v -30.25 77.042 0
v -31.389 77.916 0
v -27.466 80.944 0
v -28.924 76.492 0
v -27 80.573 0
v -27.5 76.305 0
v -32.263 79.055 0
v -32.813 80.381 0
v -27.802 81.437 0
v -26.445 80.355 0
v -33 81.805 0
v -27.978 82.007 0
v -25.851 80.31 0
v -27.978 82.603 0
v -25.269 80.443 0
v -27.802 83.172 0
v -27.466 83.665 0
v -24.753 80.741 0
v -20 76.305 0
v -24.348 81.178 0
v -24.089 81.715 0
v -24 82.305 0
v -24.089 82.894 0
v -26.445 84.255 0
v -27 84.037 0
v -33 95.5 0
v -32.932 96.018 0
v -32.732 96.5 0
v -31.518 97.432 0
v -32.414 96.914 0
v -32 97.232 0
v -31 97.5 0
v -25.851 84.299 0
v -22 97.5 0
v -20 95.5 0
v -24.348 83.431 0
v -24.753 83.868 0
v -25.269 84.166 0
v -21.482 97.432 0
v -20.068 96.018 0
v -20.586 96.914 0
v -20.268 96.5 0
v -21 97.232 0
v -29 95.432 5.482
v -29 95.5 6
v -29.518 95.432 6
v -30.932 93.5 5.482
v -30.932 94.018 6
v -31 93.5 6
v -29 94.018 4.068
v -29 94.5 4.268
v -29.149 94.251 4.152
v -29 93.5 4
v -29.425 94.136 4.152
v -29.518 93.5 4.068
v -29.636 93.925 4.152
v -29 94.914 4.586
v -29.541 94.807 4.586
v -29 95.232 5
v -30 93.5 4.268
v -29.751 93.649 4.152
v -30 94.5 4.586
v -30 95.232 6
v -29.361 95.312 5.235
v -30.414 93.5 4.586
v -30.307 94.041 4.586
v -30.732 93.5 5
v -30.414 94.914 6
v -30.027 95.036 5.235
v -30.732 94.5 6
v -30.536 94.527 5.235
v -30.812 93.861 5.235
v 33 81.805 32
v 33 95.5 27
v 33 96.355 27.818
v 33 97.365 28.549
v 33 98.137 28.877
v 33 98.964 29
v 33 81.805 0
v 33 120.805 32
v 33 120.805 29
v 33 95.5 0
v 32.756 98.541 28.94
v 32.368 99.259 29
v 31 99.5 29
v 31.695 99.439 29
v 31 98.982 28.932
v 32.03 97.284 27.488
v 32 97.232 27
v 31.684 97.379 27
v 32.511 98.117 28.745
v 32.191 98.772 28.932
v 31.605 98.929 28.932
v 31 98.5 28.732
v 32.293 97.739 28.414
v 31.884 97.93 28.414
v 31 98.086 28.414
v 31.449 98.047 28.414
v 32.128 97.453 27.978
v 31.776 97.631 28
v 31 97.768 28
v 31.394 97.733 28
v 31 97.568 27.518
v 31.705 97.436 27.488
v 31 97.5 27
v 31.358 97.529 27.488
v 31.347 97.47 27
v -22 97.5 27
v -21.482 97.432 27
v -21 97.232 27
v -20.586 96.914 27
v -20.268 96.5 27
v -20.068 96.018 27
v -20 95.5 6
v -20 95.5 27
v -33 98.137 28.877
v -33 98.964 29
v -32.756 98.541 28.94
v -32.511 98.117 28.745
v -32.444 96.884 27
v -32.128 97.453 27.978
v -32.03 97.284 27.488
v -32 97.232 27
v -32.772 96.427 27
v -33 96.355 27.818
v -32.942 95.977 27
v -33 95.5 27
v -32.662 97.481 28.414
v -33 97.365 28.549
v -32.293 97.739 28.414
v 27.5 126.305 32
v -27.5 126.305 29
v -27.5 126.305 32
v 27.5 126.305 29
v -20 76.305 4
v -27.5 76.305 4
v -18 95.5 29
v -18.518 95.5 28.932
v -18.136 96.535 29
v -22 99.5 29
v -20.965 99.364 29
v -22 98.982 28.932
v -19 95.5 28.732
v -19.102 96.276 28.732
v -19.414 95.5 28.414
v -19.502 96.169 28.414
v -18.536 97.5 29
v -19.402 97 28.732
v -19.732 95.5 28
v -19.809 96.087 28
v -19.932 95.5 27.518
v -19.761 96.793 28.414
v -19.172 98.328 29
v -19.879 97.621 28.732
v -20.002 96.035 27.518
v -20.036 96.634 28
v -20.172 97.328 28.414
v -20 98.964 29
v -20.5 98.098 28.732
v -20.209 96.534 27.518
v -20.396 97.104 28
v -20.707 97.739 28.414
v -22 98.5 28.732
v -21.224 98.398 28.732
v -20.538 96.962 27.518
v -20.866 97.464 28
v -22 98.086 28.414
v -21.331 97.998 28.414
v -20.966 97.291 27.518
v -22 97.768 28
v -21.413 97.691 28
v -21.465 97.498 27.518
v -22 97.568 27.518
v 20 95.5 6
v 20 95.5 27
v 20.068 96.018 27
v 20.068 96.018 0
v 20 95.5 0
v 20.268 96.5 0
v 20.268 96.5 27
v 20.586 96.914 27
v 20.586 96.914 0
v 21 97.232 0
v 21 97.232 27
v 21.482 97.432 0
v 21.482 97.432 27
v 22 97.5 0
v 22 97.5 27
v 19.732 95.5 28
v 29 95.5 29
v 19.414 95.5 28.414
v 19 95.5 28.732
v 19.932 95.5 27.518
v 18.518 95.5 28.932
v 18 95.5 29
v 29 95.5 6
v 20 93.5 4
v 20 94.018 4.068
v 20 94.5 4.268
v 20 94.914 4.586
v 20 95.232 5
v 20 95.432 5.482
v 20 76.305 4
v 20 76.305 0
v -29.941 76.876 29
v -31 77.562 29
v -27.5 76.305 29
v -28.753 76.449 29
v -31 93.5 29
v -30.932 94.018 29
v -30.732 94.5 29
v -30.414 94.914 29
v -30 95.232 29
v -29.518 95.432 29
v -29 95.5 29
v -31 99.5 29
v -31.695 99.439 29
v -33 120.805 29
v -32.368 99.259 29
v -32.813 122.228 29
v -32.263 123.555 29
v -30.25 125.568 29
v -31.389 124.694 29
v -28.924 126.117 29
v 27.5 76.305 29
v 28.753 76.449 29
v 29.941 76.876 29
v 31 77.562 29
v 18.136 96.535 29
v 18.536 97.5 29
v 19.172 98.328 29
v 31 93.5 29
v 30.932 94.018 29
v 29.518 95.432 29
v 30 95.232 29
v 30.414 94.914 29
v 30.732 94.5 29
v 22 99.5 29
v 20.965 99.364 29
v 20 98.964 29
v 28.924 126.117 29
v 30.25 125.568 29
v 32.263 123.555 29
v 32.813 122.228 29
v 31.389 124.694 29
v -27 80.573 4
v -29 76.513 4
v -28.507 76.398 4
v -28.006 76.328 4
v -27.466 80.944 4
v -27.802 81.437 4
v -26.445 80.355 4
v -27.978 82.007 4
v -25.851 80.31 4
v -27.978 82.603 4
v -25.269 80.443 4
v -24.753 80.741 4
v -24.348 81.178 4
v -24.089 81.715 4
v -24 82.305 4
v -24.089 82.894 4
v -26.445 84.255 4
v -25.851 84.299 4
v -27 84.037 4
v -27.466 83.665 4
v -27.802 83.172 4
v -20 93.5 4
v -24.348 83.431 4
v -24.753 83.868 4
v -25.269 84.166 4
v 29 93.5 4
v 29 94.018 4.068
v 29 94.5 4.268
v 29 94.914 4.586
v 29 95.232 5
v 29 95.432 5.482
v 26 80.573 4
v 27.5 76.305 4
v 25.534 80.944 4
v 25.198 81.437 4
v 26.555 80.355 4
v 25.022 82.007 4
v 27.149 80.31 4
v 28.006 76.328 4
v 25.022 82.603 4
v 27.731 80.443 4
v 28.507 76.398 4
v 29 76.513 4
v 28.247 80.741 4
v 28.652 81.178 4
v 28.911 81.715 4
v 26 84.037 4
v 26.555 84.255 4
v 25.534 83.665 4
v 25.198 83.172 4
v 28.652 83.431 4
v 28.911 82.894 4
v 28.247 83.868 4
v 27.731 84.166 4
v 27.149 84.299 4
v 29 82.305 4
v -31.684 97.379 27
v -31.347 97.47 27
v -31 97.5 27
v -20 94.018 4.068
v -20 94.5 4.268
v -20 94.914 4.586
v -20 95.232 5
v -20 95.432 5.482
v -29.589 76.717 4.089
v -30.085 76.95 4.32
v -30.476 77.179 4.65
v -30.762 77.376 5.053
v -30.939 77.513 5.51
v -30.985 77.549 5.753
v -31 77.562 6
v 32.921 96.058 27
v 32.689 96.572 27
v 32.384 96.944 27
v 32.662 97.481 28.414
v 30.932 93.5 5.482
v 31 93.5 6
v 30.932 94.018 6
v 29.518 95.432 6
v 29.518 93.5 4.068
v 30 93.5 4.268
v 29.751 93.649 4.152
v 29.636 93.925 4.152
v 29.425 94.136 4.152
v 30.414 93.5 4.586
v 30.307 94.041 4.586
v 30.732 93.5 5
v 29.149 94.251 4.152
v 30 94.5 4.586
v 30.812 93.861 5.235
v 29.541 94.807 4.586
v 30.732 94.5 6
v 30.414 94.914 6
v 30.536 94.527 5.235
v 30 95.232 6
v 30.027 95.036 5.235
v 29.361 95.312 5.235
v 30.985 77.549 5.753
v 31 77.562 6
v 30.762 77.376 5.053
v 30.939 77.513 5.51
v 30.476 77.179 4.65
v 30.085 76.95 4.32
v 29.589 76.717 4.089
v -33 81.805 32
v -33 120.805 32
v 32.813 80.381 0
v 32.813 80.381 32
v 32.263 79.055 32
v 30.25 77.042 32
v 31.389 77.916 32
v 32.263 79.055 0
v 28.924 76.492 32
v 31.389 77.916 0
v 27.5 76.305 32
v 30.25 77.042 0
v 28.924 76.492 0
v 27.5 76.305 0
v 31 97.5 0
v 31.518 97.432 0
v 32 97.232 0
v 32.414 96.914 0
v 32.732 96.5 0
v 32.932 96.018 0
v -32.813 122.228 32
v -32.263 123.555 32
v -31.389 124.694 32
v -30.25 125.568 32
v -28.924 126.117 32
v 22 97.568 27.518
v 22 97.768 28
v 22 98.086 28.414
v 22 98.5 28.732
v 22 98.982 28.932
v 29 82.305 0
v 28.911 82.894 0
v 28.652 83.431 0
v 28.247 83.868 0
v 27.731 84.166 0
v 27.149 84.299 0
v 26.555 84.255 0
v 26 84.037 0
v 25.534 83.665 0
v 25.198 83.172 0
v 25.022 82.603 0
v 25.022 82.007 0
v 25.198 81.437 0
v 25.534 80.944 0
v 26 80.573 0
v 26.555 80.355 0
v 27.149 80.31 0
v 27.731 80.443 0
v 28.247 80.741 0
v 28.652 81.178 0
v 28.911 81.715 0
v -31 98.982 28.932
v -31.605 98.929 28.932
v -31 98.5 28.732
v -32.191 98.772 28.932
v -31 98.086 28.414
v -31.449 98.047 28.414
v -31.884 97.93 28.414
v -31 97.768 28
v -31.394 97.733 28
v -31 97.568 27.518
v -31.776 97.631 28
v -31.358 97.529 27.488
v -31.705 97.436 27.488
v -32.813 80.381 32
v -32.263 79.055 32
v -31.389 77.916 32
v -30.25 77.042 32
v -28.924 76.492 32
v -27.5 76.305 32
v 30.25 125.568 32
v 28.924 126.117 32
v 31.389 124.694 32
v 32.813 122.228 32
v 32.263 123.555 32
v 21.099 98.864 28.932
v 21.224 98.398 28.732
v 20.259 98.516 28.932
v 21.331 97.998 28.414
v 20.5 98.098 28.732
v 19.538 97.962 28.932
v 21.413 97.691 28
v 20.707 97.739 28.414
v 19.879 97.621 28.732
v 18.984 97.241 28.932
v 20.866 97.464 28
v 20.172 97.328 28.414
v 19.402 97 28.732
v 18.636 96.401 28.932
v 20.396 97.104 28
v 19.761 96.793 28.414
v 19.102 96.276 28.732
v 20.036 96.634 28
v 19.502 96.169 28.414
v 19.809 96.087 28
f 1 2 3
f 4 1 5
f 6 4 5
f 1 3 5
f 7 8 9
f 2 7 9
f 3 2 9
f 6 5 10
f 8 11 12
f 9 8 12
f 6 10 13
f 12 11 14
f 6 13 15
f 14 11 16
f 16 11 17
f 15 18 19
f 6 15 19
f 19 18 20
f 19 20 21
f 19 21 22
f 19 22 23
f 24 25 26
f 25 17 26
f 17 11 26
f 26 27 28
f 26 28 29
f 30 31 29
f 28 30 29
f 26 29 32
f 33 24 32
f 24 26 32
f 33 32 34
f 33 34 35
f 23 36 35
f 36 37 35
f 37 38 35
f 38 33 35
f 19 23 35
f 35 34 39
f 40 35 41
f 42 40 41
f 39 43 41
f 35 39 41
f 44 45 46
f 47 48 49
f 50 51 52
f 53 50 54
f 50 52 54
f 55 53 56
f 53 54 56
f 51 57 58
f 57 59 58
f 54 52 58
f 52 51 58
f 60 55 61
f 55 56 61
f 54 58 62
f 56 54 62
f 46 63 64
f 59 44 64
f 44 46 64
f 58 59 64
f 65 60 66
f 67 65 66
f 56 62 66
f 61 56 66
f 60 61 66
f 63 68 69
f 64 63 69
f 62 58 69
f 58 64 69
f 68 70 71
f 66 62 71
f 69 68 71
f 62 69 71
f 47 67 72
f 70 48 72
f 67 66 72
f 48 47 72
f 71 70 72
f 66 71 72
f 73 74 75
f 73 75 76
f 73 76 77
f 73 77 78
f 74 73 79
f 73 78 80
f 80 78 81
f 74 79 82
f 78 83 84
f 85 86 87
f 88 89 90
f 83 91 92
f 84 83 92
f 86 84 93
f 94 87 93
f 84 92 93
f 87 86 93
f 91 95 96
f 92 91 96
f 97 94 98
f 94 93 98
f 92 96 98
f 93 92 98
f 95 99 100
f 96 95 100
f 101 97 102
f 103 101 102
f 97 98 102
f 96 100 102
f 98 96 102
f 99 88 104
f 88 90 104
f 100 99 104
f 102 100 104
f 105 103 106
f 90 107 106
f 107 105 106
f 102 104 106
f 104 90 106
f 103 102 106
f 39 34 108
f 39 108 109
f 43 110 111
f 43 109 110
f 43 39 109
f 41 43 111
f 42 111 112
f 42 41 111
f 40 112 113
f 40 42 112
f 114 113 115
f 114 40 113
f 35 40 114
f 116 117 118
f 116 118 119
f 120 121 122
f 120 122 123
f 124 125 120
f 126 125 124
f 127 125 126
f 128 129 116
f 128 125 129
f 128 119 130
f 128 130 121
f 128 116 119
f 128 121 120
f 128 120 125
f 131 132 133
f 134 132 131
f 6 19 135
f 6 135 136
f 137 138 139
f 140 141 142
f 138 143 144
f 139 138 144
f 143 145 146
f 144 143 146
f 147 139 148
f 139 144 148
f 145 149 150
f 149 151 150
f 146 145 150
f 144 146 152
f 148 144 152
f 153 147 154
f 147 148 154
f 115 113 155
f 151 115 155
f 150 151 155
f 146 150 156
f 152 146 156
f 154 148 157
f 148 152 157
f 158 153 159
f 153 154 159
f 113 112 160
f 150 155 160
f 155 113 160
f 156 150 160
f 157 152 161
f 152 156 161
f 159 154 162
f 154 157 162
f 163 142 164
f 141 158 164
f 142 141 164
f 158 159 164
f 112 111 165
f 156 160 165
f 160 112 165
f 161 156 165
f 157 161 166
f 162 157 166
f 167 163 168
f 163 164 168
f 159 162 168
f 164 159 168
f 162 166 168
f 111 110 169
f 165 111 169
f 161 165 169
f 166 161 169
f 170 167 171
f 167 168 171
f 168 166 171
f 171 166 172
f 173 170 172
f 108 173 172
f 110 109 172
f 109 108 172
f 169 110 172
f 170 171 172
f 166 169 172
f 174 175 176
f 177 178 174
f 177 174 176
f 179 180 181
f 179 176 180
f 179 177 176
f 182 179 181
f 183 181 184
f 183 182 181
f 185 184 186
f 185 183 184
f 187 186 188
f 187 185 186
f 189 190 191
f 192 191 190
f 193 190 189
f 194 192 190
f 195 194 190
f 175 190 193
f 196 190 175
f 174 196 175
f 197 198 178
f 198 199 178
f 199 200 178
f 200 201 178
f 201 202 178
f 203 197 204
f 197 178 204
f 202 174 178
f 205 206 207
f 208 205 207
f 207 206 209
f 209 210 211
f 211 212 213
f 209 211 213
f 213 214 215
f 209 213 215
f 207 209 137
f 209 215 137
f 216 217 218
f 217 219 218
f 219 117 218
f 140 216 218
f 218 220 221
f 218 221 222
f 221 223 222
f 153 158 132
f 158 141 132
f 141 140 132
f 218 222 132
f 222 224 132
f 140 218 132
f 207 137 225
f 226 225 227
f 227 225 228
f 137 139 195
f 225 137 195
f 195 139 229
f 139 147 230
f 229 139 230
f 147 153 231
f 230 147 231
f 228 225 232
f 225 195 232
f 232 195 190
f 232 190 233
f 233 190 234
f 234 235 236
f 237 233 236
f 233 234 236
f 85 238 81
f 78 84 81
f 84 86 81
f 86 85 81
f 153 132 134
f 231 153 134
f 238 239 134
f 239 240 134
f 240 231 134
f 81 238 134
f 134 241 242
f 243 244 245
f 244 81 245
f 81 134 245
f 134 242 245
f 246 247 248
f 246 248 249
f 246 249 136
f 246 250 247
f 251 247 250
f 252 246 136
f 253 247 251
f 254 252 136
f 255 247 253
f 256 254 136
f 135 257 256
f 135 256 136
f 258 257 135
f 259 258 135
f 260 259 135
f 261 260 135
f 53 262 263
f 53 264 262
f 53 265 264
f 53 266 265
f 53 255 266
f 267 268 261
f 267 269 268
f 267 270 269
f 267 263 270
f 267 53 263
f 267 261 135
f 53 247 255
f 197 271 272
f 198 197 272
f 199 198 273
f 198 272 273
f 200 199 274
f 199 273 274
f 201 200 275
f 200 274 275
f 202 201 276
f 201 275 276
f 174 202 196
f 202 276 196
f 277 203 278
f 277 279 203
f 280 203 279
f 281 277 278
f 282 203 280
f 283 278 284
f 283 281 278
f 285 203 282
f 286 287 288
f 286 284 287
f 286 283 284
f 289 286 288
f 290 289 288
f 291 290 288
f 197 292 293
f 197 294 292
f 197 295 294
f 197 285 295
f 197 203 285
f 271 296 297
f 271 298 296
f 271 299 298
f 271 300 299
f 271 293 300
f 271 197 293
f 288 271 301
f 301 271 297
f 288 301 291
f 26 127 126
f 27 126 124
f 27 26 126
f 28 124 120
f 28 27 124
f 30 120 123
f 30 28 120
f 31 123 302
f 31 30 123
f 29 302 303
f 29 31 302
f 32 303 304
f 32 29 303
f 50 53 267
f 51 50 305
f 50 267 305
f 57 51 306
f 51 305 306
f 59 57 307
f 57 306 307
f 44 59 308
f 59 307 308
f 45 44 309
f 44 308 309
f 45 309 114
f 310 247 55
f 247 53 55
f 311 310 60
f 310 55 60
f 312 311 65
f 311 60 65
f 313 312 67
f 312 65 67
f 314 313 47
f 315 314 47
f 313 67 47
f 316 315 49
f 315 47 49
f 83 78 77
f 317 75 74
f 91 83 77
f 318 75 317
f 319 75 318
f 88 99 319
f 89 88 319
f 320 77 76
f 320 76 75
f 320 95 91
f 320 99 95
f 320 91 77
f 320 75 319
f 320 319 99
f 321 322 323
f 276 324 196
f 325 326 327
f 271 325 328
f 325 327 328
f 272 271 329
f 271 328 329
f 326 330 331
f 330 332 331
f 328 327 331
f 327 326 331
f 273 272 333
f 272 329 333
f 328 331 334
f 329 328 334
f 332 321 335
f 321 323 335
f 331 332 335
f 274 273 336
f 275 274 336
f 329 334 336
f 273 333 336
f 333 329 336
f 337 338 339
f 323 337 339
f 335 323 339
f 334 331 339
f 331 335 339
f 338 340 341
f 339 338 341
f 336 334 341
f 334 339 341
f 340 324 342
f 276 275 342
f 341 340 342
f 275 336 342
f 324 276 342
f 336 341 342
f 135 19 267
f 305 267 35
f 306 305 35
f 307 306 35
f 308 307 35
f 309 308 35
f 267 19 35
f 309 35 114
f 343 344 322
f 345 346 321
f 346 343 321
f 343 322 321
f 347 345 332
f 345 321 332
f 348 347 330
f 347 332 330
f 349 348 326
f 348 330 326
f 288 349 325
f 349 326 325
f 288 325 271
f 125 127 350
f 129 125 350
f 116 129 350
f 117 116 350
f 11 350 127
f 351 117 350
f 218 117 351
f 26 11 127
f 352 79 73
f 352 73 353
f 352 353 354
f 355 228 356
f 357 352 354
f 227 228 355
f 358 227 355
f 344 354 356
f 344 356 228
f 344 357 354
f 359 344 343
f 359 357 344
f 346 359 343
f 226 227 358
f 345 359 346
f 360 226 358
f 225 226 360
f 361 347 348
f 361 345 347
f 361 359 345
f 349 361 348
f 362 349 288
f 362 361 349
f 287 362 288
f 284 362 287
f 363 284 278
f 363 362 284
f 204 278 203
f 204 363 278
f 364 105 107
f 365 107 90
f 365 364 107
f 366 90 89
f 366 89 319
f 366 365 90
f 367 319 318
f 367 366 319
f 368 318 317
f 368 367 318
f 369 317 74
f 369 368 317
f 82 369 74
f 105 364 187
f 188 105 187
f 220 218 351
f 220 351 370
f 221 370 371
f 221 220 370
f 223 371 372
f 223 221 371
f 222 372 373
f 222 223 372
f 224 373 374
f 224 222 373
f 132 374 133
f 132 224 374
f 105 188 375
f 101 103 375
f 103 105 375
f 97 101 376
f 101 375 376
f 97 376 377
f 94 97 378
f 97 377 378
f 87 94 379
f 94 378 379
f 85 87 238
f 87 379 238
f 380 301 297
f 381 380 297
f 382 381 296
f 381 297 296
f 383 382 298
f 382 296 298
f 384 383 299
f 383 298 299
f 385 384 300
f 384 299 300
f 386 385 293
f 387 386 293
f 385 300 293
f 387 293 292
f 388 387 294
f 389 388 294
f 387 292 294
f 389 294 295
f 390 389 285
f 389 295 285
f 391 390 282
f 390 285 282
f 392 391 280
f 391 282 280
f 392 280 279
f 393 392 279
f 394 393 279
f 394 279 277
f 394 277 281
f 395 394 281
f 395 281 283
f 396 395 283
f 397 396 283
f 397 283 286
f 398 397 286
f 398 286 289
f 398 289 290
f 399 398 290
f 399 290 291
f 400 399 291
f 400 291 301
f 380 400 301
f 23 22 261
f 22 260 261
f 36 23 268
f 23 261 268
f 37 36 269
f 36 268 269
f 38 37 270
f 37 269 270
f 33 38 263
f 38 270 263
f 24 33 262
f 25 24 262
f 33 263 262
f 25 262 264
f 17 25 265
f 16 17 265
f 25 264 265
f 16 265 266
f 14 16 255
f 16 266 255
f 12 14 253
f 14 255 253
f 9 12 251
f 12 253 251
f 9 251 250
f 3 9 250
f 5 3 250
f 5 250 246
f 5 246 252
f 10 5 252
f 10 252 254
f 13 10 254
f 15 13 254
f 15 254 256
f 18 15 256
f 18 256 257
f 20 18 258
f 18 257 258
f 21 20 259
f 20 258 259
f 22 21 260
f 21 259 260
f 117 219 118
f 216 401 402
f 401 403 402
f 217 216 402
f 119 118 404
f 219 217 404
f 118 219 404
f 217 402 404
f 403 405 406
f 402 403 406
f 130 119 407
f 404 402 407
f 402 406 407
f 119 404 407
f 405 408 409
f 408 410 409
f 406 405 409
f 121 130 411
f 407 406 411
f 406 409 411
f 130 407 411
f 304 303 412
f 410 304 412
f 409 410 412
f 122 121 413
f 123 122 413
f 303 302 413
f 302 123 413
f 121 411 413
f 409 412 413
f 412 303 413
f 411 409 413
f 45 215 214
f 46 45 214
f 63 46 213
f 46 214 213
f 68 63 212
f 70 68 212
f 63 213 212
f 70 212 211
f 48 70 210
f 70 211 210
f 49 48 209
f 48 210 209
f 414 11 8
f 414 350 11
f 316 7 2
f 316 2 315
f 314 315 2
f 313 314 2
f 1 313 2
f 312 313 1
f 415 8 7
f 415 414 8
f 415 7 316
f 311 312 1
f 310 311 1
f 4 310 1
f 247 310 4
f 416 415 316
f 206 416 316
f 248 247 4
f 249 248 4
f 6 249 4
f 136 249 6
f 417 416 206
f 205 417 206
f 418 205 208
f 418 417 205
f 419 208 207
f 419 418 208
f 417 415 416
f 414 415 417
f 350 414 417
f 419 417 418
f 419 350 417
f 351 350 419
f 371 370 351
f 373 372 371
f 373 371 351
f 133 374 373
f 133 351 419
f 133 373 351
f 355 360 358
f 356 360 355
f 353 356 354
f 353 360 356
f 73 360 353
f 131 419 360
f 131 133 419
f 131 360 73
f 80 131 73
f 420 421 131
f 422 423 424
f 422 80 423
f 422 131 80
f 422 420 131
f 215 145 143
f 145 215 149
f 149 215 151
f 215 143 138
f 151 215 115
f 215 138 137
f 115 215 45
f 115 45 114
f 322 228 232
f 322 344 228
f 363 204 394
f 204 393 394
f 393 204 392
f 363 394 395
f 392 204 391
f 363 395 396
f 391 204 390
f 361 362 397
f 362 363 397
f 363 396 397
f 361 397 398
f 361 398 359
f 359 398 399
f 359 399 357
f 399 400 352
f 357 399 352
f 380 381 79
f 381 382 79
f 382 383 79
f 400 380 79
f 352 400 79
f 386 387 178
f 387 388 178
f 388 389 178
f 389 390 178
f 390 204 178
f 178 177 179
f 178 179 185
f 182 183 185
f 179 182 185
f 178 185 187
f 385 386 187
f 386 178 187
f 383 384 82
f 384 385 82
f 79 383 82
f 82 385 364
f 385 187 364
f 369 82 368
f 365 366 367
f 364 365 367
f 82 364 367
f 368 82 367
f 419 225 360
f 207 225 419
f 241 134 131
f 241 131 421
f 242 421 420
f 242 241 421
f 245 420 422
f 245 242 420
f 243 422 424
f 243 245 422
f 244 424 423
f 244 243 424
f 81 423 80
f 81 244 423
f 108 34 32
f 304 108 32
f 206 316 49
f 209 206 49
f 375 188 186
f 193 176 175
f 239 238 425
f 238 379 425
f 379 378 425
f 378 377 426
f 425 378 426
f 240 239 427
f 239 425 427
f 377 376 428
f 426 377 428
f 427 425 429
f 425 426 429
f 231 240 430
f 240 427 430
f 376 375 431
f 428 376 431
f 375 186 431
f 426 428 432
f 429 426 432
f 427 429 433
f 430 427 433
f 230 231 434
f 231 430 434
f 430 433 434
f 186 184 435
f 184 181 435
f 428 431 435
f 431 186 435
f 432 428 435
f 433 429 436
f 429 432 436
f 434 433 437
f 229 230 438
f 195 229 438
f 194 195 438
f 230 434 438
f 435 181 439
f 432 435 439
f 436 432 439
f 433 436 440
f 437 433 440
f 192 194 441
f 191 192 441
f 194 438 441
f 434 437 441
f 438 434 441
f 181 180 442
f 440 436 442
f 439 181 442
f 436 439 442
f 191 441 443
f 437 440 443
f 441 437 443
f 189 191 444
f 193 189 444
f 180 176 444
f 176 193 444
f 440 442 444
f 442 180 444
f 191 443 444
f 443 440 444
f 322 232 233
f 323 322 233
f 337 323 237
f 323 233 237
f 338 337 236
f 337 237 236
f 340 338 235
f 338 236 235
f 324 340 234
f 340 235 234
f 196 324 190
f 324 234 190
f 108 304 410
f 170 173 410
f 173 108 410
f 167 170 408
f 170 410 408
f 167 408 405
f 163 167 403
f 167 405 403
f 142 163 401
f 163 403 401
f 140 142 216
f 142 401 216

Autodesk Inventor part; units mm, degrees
ref_plane "YZ Plane" through (0, 0, 0) normal (1, 0, 0) x (0, 1, 0)
ref_plane "XZ Plane" through (0, 0, 0) normal (0, 1, 0) x (-1, 0, 0)
ref_plane "XY Plane" through (0, 0, 0) normal (0, 0, 1) x (1, 0, 0)
ref_plane "Work Plane1" through (0, 0, 0) normal (0, 0, 1) x (1, 0, 0)
sketch "Sketch1" plane through (0, 0, 0) normal (0, 0, 1) x (1, 0, 0)
  line L0 (-34.9568, 37.8) -> (-33.8, 37.8) projected
  arc A0 (-52.5, 15.282) -> (-34.9568, 37.8) centre (-55.9339, 36.05) ccw projected
  line L1 (-52.5, 15.282) -> (-52.5, -15) projected
  line L2 (-47.7, -15) -> (-52.5, -15) projected
  arc A1 (-33, -29.7) -> (-47.7, -15) centre (-47.7, -29.7) ccw projected
  line L3 (-33, -29.7) -> (-33, -95.5) projected
  arc A2 (-33, -95.5) -> (-31, -97.5) centre (-31, -95.5) ccw projected
  line L4 (-31, -97.5) -> (-22, -97.5) projected
  arc A3 (-22, -97.5) -> (-20, -95.5) centre (-22, -95.5) ccw projected
  line L5 (-20, -74.5) -> (-20, -95.5) projected
  arc A4 (-18, -72.5) -> (-20, -74.5) centre (-18, -74.5) ccw projected
  line L6 (18, -72.5) -> (-18, -72.5) projected
  arc A5 (20, -74.5) -> (18, -72.5) centre (18, -74.5) ccw projected
  line L7 (20, -74.5) -> (20, -95.5) projected
  arc A6 (20, -95.5) -> (22, -97.5) centre (22, -95.5) ccw projected
  line L8 (31, -97.5) -> (22, -97.5) projected
  arc A7 (31, -97.5) -> (33, -95.5) centre (31, -95.5) ccw projected
  line L9 (33, -29.7) -> (33, -95.5) projected
  arc A8 (47.7, -15) -> (33, -29.7) centre (47.7, -29.7) ccw projected
  line L10 (52.5, -15) -> (47.7, -15) projected
  line L11 (52.5, -15) -> (52.5, 15) projected
  line L12 (52.5, 15) -> (47.7, 15) projected
  arc A9 (33, 29.7) -> (47.7, 15) centre (47.7, 29.7) ccw projected
  line L13 (33, 29.7) -> (33, 95.5) projected
  arc A10 (33, 95.5) -> (31, 97.5) centre (31, 95.5) ccw projected
  line L14 (31, 97.5) -> (22, 97.5) projected
  arc A11 (22, 97.5) -> (20, 95.5) centre (22, 95.5) ccw projected
  line L15 (20, 95.5) -> (20, 74.5) projected
  arc A12 (18, 72.5) -> (20, 74.5) centre (18, 74.5) ccw projected
  line L16 (18, 72.5) -> (-18, 72.5) projected
  arc A13 (-20, 74.5) -> (-18, 72.5) centre (-18, 74.5) ccw projected
  line L17 (-20, 74.5) -> (-20, 95.5) projected
  arc A14 (-20, 95.5) -> (-22, 97.5) centre (-22, 95.5) ccw projected
  line L18 (-22, 97.5) -> (-31, 97.5) projected
  arc A15 (-31, 97.5) -> (-33, 95.5) centre (-31, 95.5) ccw projected
  line L19 (-33, 95.5) -> (-33, 74.5) projected
  arc A16 (-33.8, 72.9) -> (-33, 74.5) centre (-35, 74.5) ccw projected
  line L20 (-33.8, 72.9) -> (-33.8, 37.8) projected
  circle A17 centre (-21.8, 62.5) radius 3 projected
  circle A18 centre (26.5, 62.5) radius 4 projected
  arc A19 (-2.5981, -57.75) -> (2.5981, -57.75) centre (0, -56.25) ccw projected
  line L21 (-2.5981, -57.75) -> (-13, -57.75) projected
  line L22 (-13, -57.75) -> (-13, -54.75) projected
  line L23 (-2.5981, -54.75) -> (-13, -54.75) projected
  arc A20 (2.5981, -54.75) -> (-2.5981, -54.75) centre (0, -56.25) ccw projected
  line L24 (13, -54.75) -> (2.5981, -54.75) projected
  line L25 (13, -57.75) -> (13, -54.75) projected
  line L26 (13, -57.75) -> (2.5981, -57.75) projected
  circle A21 centre (-10.5, -67.75) radius 1.5 projected
  circle A22 centre (10.5, -67.75) radius 1.5 projected
  line L27 (-19.3171, -45) -> (-23.6904, -45) projected
  line L28 (-23.6904, -45) -> (-23.6904, -25.95) projected
  line L29 (-23.6904, -25.95) -> (-19.382, -25.95) projected
  spline S0 degree 3 poles (-19.382, -25.95) (-19.0461, -25.9523) (-18.3968, -25.9567) (-17.4563, -26.0086) (-16.581, -26.0848) (-15.773, -26.2013) (-15.0294, -26.3366) (-14.3557, -26.5178) (-13.7463, -26.7258) (-13.195, -26.968) (-12.693, -27.2522) (-12.2198, -27.5714) (-11.7698, -27.9304) (-11.3405, -28.3302) (-10.931, -28.768) (-10.5507, -29.2527) (-10.1877, -29.7717) (-9.8476, -30.3268) (-9.5449, -30.9169) (-9.2755, -31.5328) (-9.051, -32.1747) (-8.8682, -32.8419) (-8.7226, -33.5324) (-8.6207, -34.2476) (-8.5577, -34.9867) (-8.5513, -35.4876) (-8.5481, -35.7421) knots 0 0 0 0 0.060145 0.116262 0.168646 0.217421 0.26241 0.303907 0.342233 0.377621 0.411584 0.445386 0.479752 0.514569 0.550351 0.586994 0.624785 0.663736 0.70347 0.743462 0.784023 0.82514 0.867271 0.910311 0.954426 1 1 1 1 projected
  spline S1 degree 3 poles (-8.5481, -35.7421) (-8.5566, -36.1013) (-8.5733, -36.8083) (-8.7143, -37.8459) (-8.9423, -38.8405) (-9.263, -39.7843) (-9.6601, -40.6693) (-10.1357, -41.4778) (-10.6762, -42.2113) (-11.2862, -42.8578) (-11.9457, -43.4169) (-12.6337, -43.8901) (-13.3497, -44.2699) (-13.9819, -44.5071) (-14.5316, -44.6562) (-15.0135, -44.7428) (-15.562, -44.8231) (-16.1791, -44.8922) (-16.8667, -44.9395) (-17.6225, -44.9721) (-18.4469, -44.9964) (-19.0195, -44.9988) (-19.3171, -45) knots 0 0 0 0 0.065767 0.129467 0.191414 0.252424 0.311761 0.368786 0.423917 0.478313 0.53121 0.582008 0.630995 0.679292 0.705349 0.735235 0.768913 0.806892 0.848943 0.895126 0.945474 1 1 1 1 projected
  line L30 (3.7964, 45) -> (7.4446, 45) projected
  line L31 (7.4446, 45) -> (-0.2525, 25.95) projected
  line L32 (-0.2525, 25.95) -> (-3.4237, 25.95) projected
  line L33 (-3.4237, 25.95) -> (-11.1169, 45) projected
  line L34 (-11.1169, 45) -> (-7.4649, 45) projected
  line L35 (-7.4649, 45) -> (-5.9843, 41.0923) projected
  line L36 (-5.9843, 41.0923) -> (2.3158, 41.0923) projected
  line L37 (2.3158, 41.0923) -> (3.7964, 45) projected
  spline S2 degree 3 poles (-13.4371, 30.2927) (-13.4413, 30.1296) (-13.4494, 29.8083) (-13.522, 29.3359) (-13.6305, 28.88) (-13.7882, 28.4424) (-13.9927, 28.0235) (-14.2412, 27.6214) (-14.5373, 27.2397) (-14.8711, 26.8787) (-15.2388, 26.5488) (-15.6318, 26.2577) (-16.0477, 26.0117) (-16.4842, 25.8077) (-16.9438, 25.6516) (-17.4232, 25.5409) (-17.923, 25.475) (-18.263, 25.4661) (-18.4362, 25.4615) knots 0 0 0 0 0.063173 0.124457 0.184841 0.244567 0.304319 0.3652 0.427421 0.491262 0.555499 0.618605 0.680495 0.742473 0.804991 0.868252 0.932887 1 1 1 1 projected
  spline S3 degree 3 poles (-18.4362, 25.4615) (-18.6607, 25.4697) (-19.1078, 25.4861) (-19.7689, 25.614) (-20.4146, 25.8152) (-20.935, 26.0578) (-21.349, 26.2929) (-21.6663, 26.5093) (-21.9892, 26.7572) (-22.3203, 27.0374) (-22.6533, 27.3552) (-22.9979, 27.703) (-23.3493, 28.0837) (-23.5776, 28.3557) (-23.6948, 28.4953) knots 0 0 0 0 0.10691 0.212977 0.319777 0.428556 0.485857 0.546559 0.611431 0.679821 0.753159 0.830753 0.913133 1 1 1 1 projected
  line L38 (-23.6948, 28.4953) -> (-21.138, 30.8346) projected
  spline S4 degree 3 poles (-21.138, 30.8346) (-21.0285, 30.6801) (-20.8182, 30.3835) (-20.4774, 29.9864) (-20.1381, 29.6476) (-19.7972, 29.3685) (-19.4517, 29.1509) (-19.1022, 28.9969) (-18.7506, 28.899) (-18.5144, 28.8868) (-18.3981, 28.8808) knots 0 0 0 0 0.16242 0.311824 0.448433 0.573381 0.689077 0.797573 0.900293 1 1 1 1 projected
  spline S5 degree 3 poles (-18.3981, 28.8808) (-18.2895, 28.8846) (-18.08, 28.8919) (-17.7813, 28.965) (-17.5161, 29.091) (-17.2847, 29.2559) (-17.1014, 29.4544) (-16.955, 29.6627) (-16.8726, 29.8926) (-16.8617, 30.0505) (-16.8564, 30.1286) knots 0 0 0 0 0.148126 0.285993 0.416634 0.54738 0.671583 0.784401 0.893266 1 1 1 1 projected
  spline S6 degree 3 poles (-16.8564, 30.1286) (-16.8597, 30.2079) (-16.8665, 30.3676) (-16.932, 30.6016) (-17.0306, 30.8303) (-17.1249, 30.9695) (-17.1731, 31.0407) knots 0 0 0 0 0.241881 0.487115 0.737838 1 1 1 1 projected
  spline S7 degree 3 poles (-17.1731, 31.0407) (-17.2169, 31.096) (-17.3177, 31.2233) (-17.51, 31.425) (-17.7515, 31.672) (-18.0515, 31.9559) (-18.3975, 32.2869) (-18.8055, 32.6521) (-19.2639, 33.0626) (-19.5897, 33.3485) (-19.7604, 33.4983) knots 0 0 0 0 0.059234 0.136349 0.233805 0.349411 0.483179 0.635967 0.809243 1 1 1 1 projected
  spline S8 degree 3 poles (-19.7604, 33.4983) (-19.9207, 33.6369) (-20.2248, 33.9001) (-20.6575, 34.2737) (-21.0377, 34.6098) (-21.3711, 34.9034) (-21.6525, 35.1575) (-21.8832, 35.3734) (-22.066, 35.5468) (-22.1698, 35.6516) (-22.2142, 35.6963) knots 0 0 0 0 0.192953 0.366184 0.520457 0.655012 0.770624 0.865677 0.942675 1 1 1 1 projected
  spline S9 degree 3 poles (-22.2142, 35.6963) (-22.3823, 35.8783) (-22.7056, 36.2282) (-23.1258, 36.7704) (-23.4717, 37.2997) (-23.7392, 37.8261) (-23.9412, 38.3571) (-24.0837, 38.9058) (-24.169, 39.4779) (-24.1785, 39.8683) (-24.1833, 40.0658) knots 0 0 0 0 0.150833 0.289954 0.417139 0.535255 0.648751 0.762405 0.879827 1 1 1 1 projected
  spline S10 degree 3 poles (-24.1833, 40.0658) (-24.1799, 40.2582) (-24.1732, 40.6357) (-24.0912, 41.1881) (-23.9744, 41.7167) (-23.7937, 42.2159) (-23.5735, 42.6938) (-23.2975, 43.143) (-22.9733, 43.568) (-22.6017, 43.9612) (-22.1907, 44.318) (-21.7499, 44.6356) (-21.2749, 44.8978) (-20.7698, 45.1138) (-20.2349, 45.2801) (-19.6709, 45.403) (-19.0767, 45.4768) (-18.6705, 45.4845) (-18.4629, 45.4885) knots 0 0 0 0 0.065201 0.127927 0.189047 0.248544 0.307607 0.367248 0.426963 0.488617 0.550392 0.611331 0.672556 0.734024 0.797341 0.86225 0.929625 1 1 1 1 projected
  spline S11 degree 3 poles (-18.4629, 45.4885) (-18.3, 45.4856) (-17.9773, 45.4798) (-17.5017, 45.4331) (-17.0425, 45.3577) (-16.6001, 45.2496) (-16.1726, 45.1126) (-15.76, 44.9452) (-15.3651, 44.745) (-14.9849, 44.5159) (-14.6212, 44.2499) (-14.2696, 43.9524) (-13.9334, 43.6189) (-13.611, 43.2501) (-13.3046, 42.8451) (-13.004, 42.4093) (-12.7227, 41.9348) (-12.549, 41.602) (-12.4602, 41.4319) knots 0 0 0 0 0.063551 0.125868 0.18624 0.244977 0.303358 0.36123 0.418489 0.475937 0.534204 0.594059 0.655469 0.718772 0.784975 0.853522 0.925182 1 1 1 1 projected
  line L39 (-12.4602, 41.4319) -> (-15.4673, 39.6269) projected
  spline S12 degree 3 poles (-15.4673, 39.6269) (-15.5783, 39.8199) (-15.7912, 40.1899) (-16.1519, 40.687) (-16.5214, 41.1127) (-16.9082, 41.4595) (-17.3078, 41.7319) (-17.7219, 41.9266) (-18.1509, 42.0472) (-18.4431, 42.0619) (-18.5889, 42.0692) knots 0 0 0 0 0.160458 0.307612 0.442139 0.566229 0.681222 0.789558 0.895029 1 1 1 1 projected
  spline S13 degree 3 poles (-18.5889, 42.0692) (-18.7371, 42.0632) (-19.0248, 42.0516) (-19.4353, 41.9442) (-19.8118, 41.7754) (-20.1371, 41.5347) (-20.4127, 41.2569) (-20.616, 40.9478) (-20.7437, 40.6134) (-20.7572, 40.3811) (-20.764, 40.2642) knots 0 0 0 0 0.141986 0.275473 0.404346 0.53543 0.661427 0.777867 0.88828 1 1 1 1 projected
  spline S14 degree 3 poles (-20.764, 40.2642) (-20.7578, 40.1555) (-20.745, 39.9347) (-20.6512, 39.6064) (-20.5044, 39.2782) (-20.3309, 39.009) (-20.1542, 38.7836) (-19.9853, 38.5884) (-19.7796, 38.3726) (-19.5377, 38.1361) (-19.2627, 37.8768) (-18.9544, 37.5947) (-18.6093, 37.2923) (-18.3653, 37.0863) (-18.2378, 36.9785) knots 0 0 0 0 0.076347 0.155091 0.238352 0.328404 0.379384 0.439618 0.509831 0.588875 0.677436 0.775547 0.882636 1 1 1 1 projected
  spline S15 degree 3 poles (-18.2378, 36.9785) (-17.9953, 36.7734) (-17.5299, 36.3796) (-16.8723, 35.7981) (-16.2797, 35.2545) (-15.7573, 34.7423) (-15.2983, 34.2709) (-14.906, 33.8364) (-14.5847, 33.4355) (-14.2465, 32.9607) (-13.9251, 32.3821) (-13.6474, 31.686) (-13.4672, 30.99) (-13.4471, 30.5227) (-13.4371, 30.2927) knots 0 0 0 0 0.112125 0.215201 0.309902 0.395959 0.473447 0.54214 0.602523 0.654726 0.747804 0.835278 0.918925 1 1 1 1 projected
  spline S16 degree 3 poles (13.9212, -30.2927) (13.9253, -30.1296) (13.9334, -29.8083) (14.006, -29.3358) (14.1149, -28.8801) (14.2713, -28.4413) (14.4812, -28.0244) (14.7291, -27.6225) (15.0221, -27.237) (15.3579, -26.8764) (15.7266, -26.5449) (16.1197, -26.2541) (16.5338, -26.0081) (16.9701, -25.8078) (17.4277, -25.6514) (17.9072, -25.5409) (18.4071, -25.475) (18.7471, -25.4661) (18.9203, -25.4615) knots 0 0 0 0 0.063175 0.124462 0.184848 0.244577 0.304549 0.365432 0.427356 0.491896 0.556136 0.619244 0.681136 0.742463 0.804983 0.868247 0.932885 1 1 1 1 projected
  spline S17 degree 3 poles (18.9203, -25.4615) (19.1447, -25.4698) (19.5918, -25.4862) (20.2531, -25.6138) (20.8993, -25.8165) (21.4216, -26.0553) (21.8337, -26.2941) (22.1502, -26.5094) (22.4748, -26.7567) (22.8016, -27.0431) (23.1428, -27.3521) (23.4813, -27.7049) (23.8337, -28.0834) (24.0618, -28.3556) (24.1788, -28.4953) knots 0 0 0 0 0.106908 0.212971 0.319769 0.429097 0.485871 0.546571 0.611442 0.680224 0.75359 0.830757 0.913135 1 1 1 1 projected
  line L40 (24.1788, -28.4953) -> (21.6221, -30.8346) projected
  spline S18 degree 3 poles (21.6221, -30.8346) (21.5126, -30.6801) (21.3023, -30.3834) (20.9612, -29.9866) (20.6222, -29.6459) (20.2782, -29.371) (19.9353, -29.1497) (19.5861, -28.9971) (19.2347, -28.8989) (18.9984, -28.8868) (18.8821, -28.8808) knots 0 0 0 0 0.162432 0.311848 0.448466 0.574275 0.689054 0.797558 0.900286 1 1 1 1 projected
  spline S19 degree 3 poles (18.8821, -28.8808) (18.7735, -28.8845) (18.5639, -28.8916) (18.2664, -28.966) (17.9991, -29.0863) (17.769, -29.2525) (17.584, -29.4509) (17.4401, -29.6621) (17.3564, -29.8925) (17.3457, -30.0504) (17.3404, -30.1286) knots 0 0 0 0 0.14802 0.285787 0.415605 0.546256 0.67037 0.784556 0.893342 1 1 1 1 projected
  spline S20 degree 3 poles (17.3404, -30.1286) (17.3437, -30.2079) (17.3505, -30.3676) (17.416, -30.6016) (17.5147, -30.8303) (17.6089, -30.9695) (17.6571, -31.0407) knots 0 0 0 0 0.241881 0.487115 0.737838 1 1 1 1 projected
  spline S21 degree 3 poles (17.6571, -31.0407) (17.7011, -31.0958) (17.8029, -31.2235) (17.9912, -31.4289) (18.2374, -31.6701) (18.5311, -31.9592) (18.8833, -32.2849) (19.2865, -32.6567) (19.7496, -33.0619) (20.0741, -33.348) (20.2444, -33.4983) knots 0 0 0 0 0.059231 0.13713 0.233823 0.348656 0.483195 0.636695 0.809253 1 1 1 1 projected
  spline S22 degree 3 poles (20.2444, -33.4983) (20.4047, -33.6369) (20.7089, -33.9) (21.1411, -34.2741) (21.5235, -34.6091) (21.8525, -34.9076) (22.1379, -35.1573) (22.3671, -35.3735) (22.55, -35.5468) (22.6539, -35.6516) (22.6982, -35.6963) knots 0 0 0 0 0.192953 0.366186 0.520459 0.655785 0.770623 0.865677 0.942674 1 1 1 1 projected
  spline S23 degree 3 poles (22.6982, -35.6963) (22.8665, -35.8783) (23.1899, -36.2281) (23.6095, -36.7716) (23.9585, -37.298) (24.2288, -37.8224) (24.4248, -38.3553) (24.5675, -38.9046) (24.6531, -39.4779) (24.6625, -39.8683) (24.6673, -40.0658) knots 0 0 0 0 0.150802 0.289894 0.417473 0.534875 0.648075 0.762455 0.879852 1 1 1 1 projected
  spline S24 degree 3 poles (24.6673, -40.0658) (24.6639, -40.2582) (24.6572, -40.6357) (24.5753, -41.1881) (24.4583, -41.7167) (24.2781, -42.2161) (24.0566, -42.6924) (23.7866, -43.1456) (23.4565, -43.5652) (23.0899, -43.9625) (22.678, -44.3191) (22.2351, -44.6335) (21.7603, -44.899) (21.2573, -45.1177) (20.7198, -45.2801) (20.1561, -45.4028) (19.5608, -45.4768) (19.1545, -45.4845) (18.947, -45.4885) knots 0 0 0 0 0.06519 0.127905 0.189015 0.248502 0.307556 0.366963 0.426931 0.48828 0.550044 0.611324 0.672163 0.734187 0.796953 0.862273 0.929637 1 1 1 1 projected
  spline S25 degree 3 poles (18.947, -45.4885) (18.784, -45.4856) (18.4613, -45.4799) (17.9858, -45.4331) (17.5265, -45.3578) (17.0843, -45.2491) (16.6566, -45.1145) (16.2479, -44.9395) (15.8528, -44.7415) (15.4726, -44.5122) (15.1104, -44.2458) (14.7559, -43.9529) (14.4216, -43.6174) (14.0947, -43.2516) (13.7889, -42.8448) (13.488, -42.4094) (13.2068, -41.9348) (13.033, -41.602) (12.9442, -41.4319) knots 0 0 0 0 0.063568 0.125901 0.186289 0.24504 0.303437 0.361056 0.418329 0.475792 0.534074 0.593626 0.655051 0.718698 0.784919 0.853484 0.925163 1 1 1 1 projected
  line L41 (12.9442, -41.4319) -> (15.9513, -39.6269) projected
  spline S26 degree 3 poles (15.9513, -39.6269) (16.0623, -39.8199) (16.2752, -40.1899) (16.6359, -40.687) (17.0054, -41.1127) (17.3923, -41.4595) (17.7918, -41.7319) (18.2059, -41.9266) (18.6349, -42.0472) (18.9271, -42.0619) (19.0729, -42.0692) knots 0 0 0 0 0.160458 0.307612 0.442139 0.566229 0.681222 0.789558 0.895029 1 1 1 1 projected
  spline S27 degree 3 poles (19.0729, -42.0692) (19.2212, -42.0633) (19.5089, -42.0518) (19.9202, -41.9432) (20.299, -41.7767) (20.6246, -41.5344) (20.9012, -41.2581) (21.0994, -40.9466) (21.228, -40.6135) (21.2414, -40.3811) (21.2481, -40.2642) knots 0 0 0 0 0.141922 0.275349 0.405274 0.536299 0.66224 0.777967 0.88833 1 1 1 1 projected
  spline S28 degree 3 poles (21.2481, -40.2642) (21.2418, -40.1555) (21.229, -39.9347) (21.1354, -39.6062) (20.9879, -39.2793) (20.8186, -39.0084) (20.642, -38.7825) (20.469, -38.5898) (20.2639, -38.3723) (20.0216, -38.1362) (19.7467, -37.8768) (19.4384, -37.5947) (19.0933, -37.2923) (18.8494, -37.0863) (18.7218, -36.9785) knots 0 0 0 0 0.076338 0.155074 0.238325 0.327891 0.378865 0.43968 0.509886 0.588921 0.677472 0.775572 0.882649 1 1 1 1 projected
  spline S29 degree 3 poles (18.7218, -36.9785) (18.4793, -36.7734) (18.014, -36.3796) (17.3562, -35.7981) (16.764, -35.2543) (16.2411, -34.7437) (15.7861, -34.2697) (15.394, -33.8364) (15.0711, -33.4353) (14.7362, -32.9562) (14.4091, -32.3806) (14.131, -31.6849) (13.9513, -30.99) (13.9311, -30.5227) (13.9212, -30.2927) knots 0 0 0 0 0.11214 0.215231 0.309946 0.396015 0.473203 0.541905 0.602297 0.654875 0.748186 0.835255 0.918914 1 1 1 1 projected
  line L42 (-3.3124, -45) -> (-6.9606, -45) projected
  line L43 (-6.9606, -45) -> (0.7365, -25.95) projected
  line L44 (0.7365, -25.95) -> (3.9077, -25.95) projected
  line L45 (3.9077, -25.95) -> (11.601, -45) projected
  line L46 (11.601, -45) -> (7.9489, -45) projected
  line L47 (7.9489, -45) -> (6.4683, -41.0923) projected
  line L48 (6.4683, -41.0923) -> (-1.8317, -41.0923) projected
  line L49 (-1.8317, -41.0923) -> (-3.3124, -45) projected
  line L50 (19.8012, 45) -> (24.1744, 45) projected
  line L51 (24.1744, 45) -> (24.1744, 25.95) projected
  line L52 (24.1744, 25.95) -> (19.866, 25.95) projected
  spline S30 degree 3 poles (19.866, 25.95) (19.5301, 25.9523) (18.8809, 25.9569) (17.9402, 26.008) (17.0655, 26.0867) (16.2562, 26.1949) (15.514, 26.338) (14.8397, 26.5176) (14.2313, 26.7249) (13.6819, 26.9689) (13.1804, 27.2533) (12.7041, 27.57) (12.2542, 27.9308) (11.8241, 28.3287) (11.4196, 28.7709) (11.0337, 29.25) (10.6761, 29.7731) (10.3359, 30.3276) (10.0282, 30.9159) (9.7598, 31.5329) (9.5349, 32.1747) (9.3523, 32.8419) (9.2066, 33.5324) (9.1047, 34.2476) (9.0417, 34.9867) (9.0354, 35.4876) (9.0321, 35.7421) knots 0 0 0 0 0.060148 0.116267 0.168654 0.217399 0.262434 0.303933 0.34226 0.377441 0.411406 0.445398 0.479766 0.514584 0.550214 0.587001 0.624663 0.663615 0.703456 0.74345 0.784013 0.825133 0.867265 0.910306 0.954424 1 1 1 1 projected
  spline S31 degree 3 poles (9.0321, 35.7421) (9.0406, 36.1013) (9.0573, 36.8083) (9.1983, 37.8459) (9.4263, 38.8405) (9.7469, 39.7844) (10.1444, 40.6691) (10.6192, 41.4791) (11.1644, 42.21) (11.7737, 42.8582) (12.4333, 43.4153) (13.1189, 43.8925) (13.8369, 44.2687) (14.4696, 44.5073) (15.0183, 44.6557) (15.5, 44.7434) (16.0471, 44.8238) (16.6649, 44.886) (17.3504, 44.9414) (18.1066, 44.9715) (18.9309, 44.9965) (19.5035, 44.9988) (19.8012, 45) knots 0 0 0 0 0.065773 0.129478 0.19143 0.252446 0.311787 0.368818 0.424092 0.478492 0.531394 0.582004 0.631201 0.679503 0.705561 0.735222 0.769132 0.806858 0.84893 0.895117 0.94547 1 1 1 1 projected
  line L53 (33, 76.3047) -> (-33, 76.3047)
  line L54 (20, 76.3047) -> (33, 76.3047)
  line L55 (-33, 76.3047) -> (-20, 76.3047)
  point P0 (0, 0)
extrude "Extrusion1" add sketch "Sketch1" along normal blind 4 contours L19 A15 L18 A14 L17 L53 | L15 A11 L14 A10 L13 L53
sketch "Sketch2" plane through (0, 0, 4) normal (0, 0, 1) x (1, 0, 0)
  arc A0 (33, 95.5) -> (31, 97.5) centre (31, 95.5) ccw projected
  line L0 (31, 97.5) -> (22, 97.5) projected
  arc A1 (22, 97.5) -> (20, 95.5) centre (22, 95.5) ccw projected
  line L1 (20, 95.5) -> (20, 76.3047) projected
  line L2 (20, 76.3047) -> (33, 76.3047) projected
  line L3 (33, 76.3047) -> (33, 95.5) projected
  arc A2 (-20, 95.5) -> (-22, 97.5) centre (-22, 95.5) ccw projected
  line L4 (-22, 97.5) -> (-31, 97.5) projected
  arc A3 (-31, 97.5) -> (-33, 95.5) centre (-31, 95.5) ccw projected
  line L5 (-33, 95.5) -> (-33, 76.3047) projected
  line L6 (-33, 76.3047) -> (-20, 76.3047) projected
  line L7 (-20, 76.3047) -> (-20, 95.5) projected
  circle A4 centre (27, 82.3047) radius 2
  circle A5 centre (-26, 82.3047) radius 2
  point P0 (0, 0)
  dimension "d2" = 6
  dimension "d3" = 6
  dimension "d4" = 6
  dimension "d5" = 6
  dimension "d6" = 4
  dimension "d7" = 4
extrude "Extrusion2" cut sketch "Sketch2" against normal blind 7 contours A4 | A5
sketch "Sketch3" plane through (0, 0, 4) normal (0, 0, 1) x (1, 0, 0)
  circle A0 centre (27, 82.3047) radius 2 projected
  arc A1 (33, 95.5) -> (31, 97.5) centre (31, 95.5) ccw projected
  line L0 (31, 97.5) -> (22, 97.5) projected
  arc A2 (22, 97.5) -> (20, 95.5) centre (22, 95.5) ccw projected
  line L1 (20, 95.5) -> (20, 76.3047) projected
  line L2 (20, 76.3047) -> (33, 76.3047) projected
  line L3 (33, 76.3047) -> (33, 95.5) projected
  circle A3 centre (-26, 82.3047) radius 2 projected
  arc A4 (-20, 95.5) -> (-22, 97.5) centre (-22, 95.5) ccw projected
  line L4 (-22, 97.5) -> (-31, 97.5) projected
  arc A5 (-31, 97.5) -> (-33, 95.5) centre (-31, 95.5) ccw projected
  line L5 (-33, 95.5) -> (-33, 76.3047) projected
  line L6 (-33, 76.3047) -> (-20, 76.3047) projected
  line L7 (-20, 76.3047) -> (-20, 95.5) projected
  line L8 (20, 76.3047) -> (33, 76.3047) projected
  line L9 (-33, 76.3047) -> (-20, 76.3047) projected
  line L10 (-31, 76.3047) -> (-31, 95.5)
  line L11 (-31, 95.5) -> (-22, 95.5)
  line L12 (-22, 95.5) -> (-20, 95.5)
  line L13 (31, 76.3047) -> (31, 95.5)
  line L14 (31, 95.5) -> (22, 95.5)
  line L15 (22, 95.5) -> (20, 95.5)
  line L16 (-33, 95.5) -> (-33, 76.3047) projected
  line L17 (-31, 76.3047) -> (-33, 76.3047)
  line L18 (-33, 76.3047) -> (-33, 95.5)
  line L19 (-20, 76.3047) -> (-20, 95.5) projected
  line L20 (-20, 95.5) -> (-20, 76.3047)
  line L21 (-20, 76.3047) -> (-31, 76.3047)
  arc A6 (22, 97.5) -> (20, 95.5) centre (22, 95.5) ccw projected
  line L22 (20, 95.5) -> (20, 76.3047)
  line L23 (20, 76.3047) -> (31, 76.3047)
  point P0 (0, 0)
extrude "Extrusion3" add sketch "Sketch3" along normal blind 25 contours L3 L2 L13 L14 L15 A2 L0 A1 | L12 L11 L10 L6 L5 A5 L4 A4
fillet "Fillet1" radius 2 6 edges at (31, 95.5, 16.5) (-31, 95.5, 16.5) (-25.5, 95.5, 4) (-31, 85.9023, 4) (25.5, 95.5, 4) (31, 85.9023, 4)
sketch "Sketch4" plane through (0, 0, 29) normal (0, 0, 1) x (1, 0, 0)
  arc A0 (33, 95.5) -> (31, 97.5) centre (31, 95.5) ccw projected
  line L0 (31, 97.5) -> (22, 97.5) projected
  arc A1 (22, 97.5) -> (20, 95.5) centre (22, 95.5) ccw projected
  line L1 (20, 95.5) -> (29, 95.5) projected
  arc A2 (31, 93.5) -> (29, 95.5) centre (29, 93.5) ccw projected
  line L2 (31, 93.5) -> (31, 76.3047) projected
  line L3 (31, 76.3047) -> (33, 76.3047) projected
  line L4 (33, 76.3047) -> (33, 95.5) projected
  arc A3 (-20, 95.5) -> (-22, 97.5) centre (-22, 95.5) ccw projected
  line L5 (-22, 97.5) -> (-31, 97.5) projected
  arc A4 (-31, 97.5) -> (-33, 95.5) centre (-31, 95.5) ccw projected
  line L6 (-33, 95.5) -> (-33, 76.3047) projected
  line L7 (-33, 76.3047) -> (-31, 76.3047) projected
  line L8 (-31, 76.3047) -> (-31, 93.5) projected
  arc A5 (-29, 95.5) -> (-31, 93.5) centre (-29, 93.5) ccw projected
  line L9 (-29, 95.5) -> (-20, 95.5) projected
  line L10 (33, 76.3047) -> (-33, 76.3047)
  line L11 (-33, 76.3047) -> (-33, 126.3047)
  line L12 (-33, 126.3047) -> (33, 126.3047)
  line L13 (33, 126.3047) -> (33, 76.3047)
  point P0 (0, 0)
  dimension "d13" = 50
extrude "Extrusion4" add sketch "Sketch4" along normal blind 3
fillet "Fillet2" radius 2 6 edges at (26.5, 97.5, 29) (32.4142, 96.9142, 29) (20.5858, 96.9142, 29) (-32.4142, 96.9142, 29) (-20.5858, 96.9142, 29) (-26.5, 97.5, 29)
fillet "Fillet3" radius 5.5 4 edges at (-33, 126.3047, 30.5) (33, 126.3047, 30.5) (-33, 76.3047, 16) (33, 76.3047, 16)
equation "\"d4\" = d2"
equation "\"d5\" = d3"
equation "\"d7\" = d6"
properties part number "electronics support"
